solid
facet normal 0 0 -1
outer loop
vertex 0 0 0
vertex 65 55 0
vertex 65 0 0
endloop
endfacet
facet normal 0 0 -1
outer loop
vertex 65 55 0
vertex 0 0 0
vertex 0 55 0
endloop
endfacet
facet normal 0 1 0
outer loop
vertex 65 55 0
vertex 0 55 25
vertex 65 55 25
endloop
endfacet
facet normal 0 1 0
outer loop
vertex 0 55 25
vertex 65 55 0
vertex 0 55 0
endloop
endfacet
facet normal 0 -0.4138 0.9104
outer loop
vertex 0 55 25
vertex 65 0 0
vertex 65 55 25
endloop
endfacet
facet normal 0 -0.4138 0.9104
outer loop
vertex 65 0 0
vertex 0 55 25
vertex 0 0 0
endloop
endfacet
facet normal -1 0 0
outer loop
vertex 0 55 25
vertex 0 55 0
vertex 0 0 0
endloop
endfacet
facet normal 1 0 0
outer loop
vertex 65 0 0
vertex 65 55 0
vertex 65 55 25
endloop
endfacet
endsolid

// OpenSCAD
 module prism(l, w, h)
 {
    polyhedron
    (
        points=[[0,0,0], [l,0,0], [l,w,0], [0,w,0], [0,w,h], [l,w,h]],
        faces=[[0,1,2,3],[5,4,3,2],[0,4,5,1],[0,3,4],[5,2,1]]
    );
 }

 prism(65, 55, 25);
